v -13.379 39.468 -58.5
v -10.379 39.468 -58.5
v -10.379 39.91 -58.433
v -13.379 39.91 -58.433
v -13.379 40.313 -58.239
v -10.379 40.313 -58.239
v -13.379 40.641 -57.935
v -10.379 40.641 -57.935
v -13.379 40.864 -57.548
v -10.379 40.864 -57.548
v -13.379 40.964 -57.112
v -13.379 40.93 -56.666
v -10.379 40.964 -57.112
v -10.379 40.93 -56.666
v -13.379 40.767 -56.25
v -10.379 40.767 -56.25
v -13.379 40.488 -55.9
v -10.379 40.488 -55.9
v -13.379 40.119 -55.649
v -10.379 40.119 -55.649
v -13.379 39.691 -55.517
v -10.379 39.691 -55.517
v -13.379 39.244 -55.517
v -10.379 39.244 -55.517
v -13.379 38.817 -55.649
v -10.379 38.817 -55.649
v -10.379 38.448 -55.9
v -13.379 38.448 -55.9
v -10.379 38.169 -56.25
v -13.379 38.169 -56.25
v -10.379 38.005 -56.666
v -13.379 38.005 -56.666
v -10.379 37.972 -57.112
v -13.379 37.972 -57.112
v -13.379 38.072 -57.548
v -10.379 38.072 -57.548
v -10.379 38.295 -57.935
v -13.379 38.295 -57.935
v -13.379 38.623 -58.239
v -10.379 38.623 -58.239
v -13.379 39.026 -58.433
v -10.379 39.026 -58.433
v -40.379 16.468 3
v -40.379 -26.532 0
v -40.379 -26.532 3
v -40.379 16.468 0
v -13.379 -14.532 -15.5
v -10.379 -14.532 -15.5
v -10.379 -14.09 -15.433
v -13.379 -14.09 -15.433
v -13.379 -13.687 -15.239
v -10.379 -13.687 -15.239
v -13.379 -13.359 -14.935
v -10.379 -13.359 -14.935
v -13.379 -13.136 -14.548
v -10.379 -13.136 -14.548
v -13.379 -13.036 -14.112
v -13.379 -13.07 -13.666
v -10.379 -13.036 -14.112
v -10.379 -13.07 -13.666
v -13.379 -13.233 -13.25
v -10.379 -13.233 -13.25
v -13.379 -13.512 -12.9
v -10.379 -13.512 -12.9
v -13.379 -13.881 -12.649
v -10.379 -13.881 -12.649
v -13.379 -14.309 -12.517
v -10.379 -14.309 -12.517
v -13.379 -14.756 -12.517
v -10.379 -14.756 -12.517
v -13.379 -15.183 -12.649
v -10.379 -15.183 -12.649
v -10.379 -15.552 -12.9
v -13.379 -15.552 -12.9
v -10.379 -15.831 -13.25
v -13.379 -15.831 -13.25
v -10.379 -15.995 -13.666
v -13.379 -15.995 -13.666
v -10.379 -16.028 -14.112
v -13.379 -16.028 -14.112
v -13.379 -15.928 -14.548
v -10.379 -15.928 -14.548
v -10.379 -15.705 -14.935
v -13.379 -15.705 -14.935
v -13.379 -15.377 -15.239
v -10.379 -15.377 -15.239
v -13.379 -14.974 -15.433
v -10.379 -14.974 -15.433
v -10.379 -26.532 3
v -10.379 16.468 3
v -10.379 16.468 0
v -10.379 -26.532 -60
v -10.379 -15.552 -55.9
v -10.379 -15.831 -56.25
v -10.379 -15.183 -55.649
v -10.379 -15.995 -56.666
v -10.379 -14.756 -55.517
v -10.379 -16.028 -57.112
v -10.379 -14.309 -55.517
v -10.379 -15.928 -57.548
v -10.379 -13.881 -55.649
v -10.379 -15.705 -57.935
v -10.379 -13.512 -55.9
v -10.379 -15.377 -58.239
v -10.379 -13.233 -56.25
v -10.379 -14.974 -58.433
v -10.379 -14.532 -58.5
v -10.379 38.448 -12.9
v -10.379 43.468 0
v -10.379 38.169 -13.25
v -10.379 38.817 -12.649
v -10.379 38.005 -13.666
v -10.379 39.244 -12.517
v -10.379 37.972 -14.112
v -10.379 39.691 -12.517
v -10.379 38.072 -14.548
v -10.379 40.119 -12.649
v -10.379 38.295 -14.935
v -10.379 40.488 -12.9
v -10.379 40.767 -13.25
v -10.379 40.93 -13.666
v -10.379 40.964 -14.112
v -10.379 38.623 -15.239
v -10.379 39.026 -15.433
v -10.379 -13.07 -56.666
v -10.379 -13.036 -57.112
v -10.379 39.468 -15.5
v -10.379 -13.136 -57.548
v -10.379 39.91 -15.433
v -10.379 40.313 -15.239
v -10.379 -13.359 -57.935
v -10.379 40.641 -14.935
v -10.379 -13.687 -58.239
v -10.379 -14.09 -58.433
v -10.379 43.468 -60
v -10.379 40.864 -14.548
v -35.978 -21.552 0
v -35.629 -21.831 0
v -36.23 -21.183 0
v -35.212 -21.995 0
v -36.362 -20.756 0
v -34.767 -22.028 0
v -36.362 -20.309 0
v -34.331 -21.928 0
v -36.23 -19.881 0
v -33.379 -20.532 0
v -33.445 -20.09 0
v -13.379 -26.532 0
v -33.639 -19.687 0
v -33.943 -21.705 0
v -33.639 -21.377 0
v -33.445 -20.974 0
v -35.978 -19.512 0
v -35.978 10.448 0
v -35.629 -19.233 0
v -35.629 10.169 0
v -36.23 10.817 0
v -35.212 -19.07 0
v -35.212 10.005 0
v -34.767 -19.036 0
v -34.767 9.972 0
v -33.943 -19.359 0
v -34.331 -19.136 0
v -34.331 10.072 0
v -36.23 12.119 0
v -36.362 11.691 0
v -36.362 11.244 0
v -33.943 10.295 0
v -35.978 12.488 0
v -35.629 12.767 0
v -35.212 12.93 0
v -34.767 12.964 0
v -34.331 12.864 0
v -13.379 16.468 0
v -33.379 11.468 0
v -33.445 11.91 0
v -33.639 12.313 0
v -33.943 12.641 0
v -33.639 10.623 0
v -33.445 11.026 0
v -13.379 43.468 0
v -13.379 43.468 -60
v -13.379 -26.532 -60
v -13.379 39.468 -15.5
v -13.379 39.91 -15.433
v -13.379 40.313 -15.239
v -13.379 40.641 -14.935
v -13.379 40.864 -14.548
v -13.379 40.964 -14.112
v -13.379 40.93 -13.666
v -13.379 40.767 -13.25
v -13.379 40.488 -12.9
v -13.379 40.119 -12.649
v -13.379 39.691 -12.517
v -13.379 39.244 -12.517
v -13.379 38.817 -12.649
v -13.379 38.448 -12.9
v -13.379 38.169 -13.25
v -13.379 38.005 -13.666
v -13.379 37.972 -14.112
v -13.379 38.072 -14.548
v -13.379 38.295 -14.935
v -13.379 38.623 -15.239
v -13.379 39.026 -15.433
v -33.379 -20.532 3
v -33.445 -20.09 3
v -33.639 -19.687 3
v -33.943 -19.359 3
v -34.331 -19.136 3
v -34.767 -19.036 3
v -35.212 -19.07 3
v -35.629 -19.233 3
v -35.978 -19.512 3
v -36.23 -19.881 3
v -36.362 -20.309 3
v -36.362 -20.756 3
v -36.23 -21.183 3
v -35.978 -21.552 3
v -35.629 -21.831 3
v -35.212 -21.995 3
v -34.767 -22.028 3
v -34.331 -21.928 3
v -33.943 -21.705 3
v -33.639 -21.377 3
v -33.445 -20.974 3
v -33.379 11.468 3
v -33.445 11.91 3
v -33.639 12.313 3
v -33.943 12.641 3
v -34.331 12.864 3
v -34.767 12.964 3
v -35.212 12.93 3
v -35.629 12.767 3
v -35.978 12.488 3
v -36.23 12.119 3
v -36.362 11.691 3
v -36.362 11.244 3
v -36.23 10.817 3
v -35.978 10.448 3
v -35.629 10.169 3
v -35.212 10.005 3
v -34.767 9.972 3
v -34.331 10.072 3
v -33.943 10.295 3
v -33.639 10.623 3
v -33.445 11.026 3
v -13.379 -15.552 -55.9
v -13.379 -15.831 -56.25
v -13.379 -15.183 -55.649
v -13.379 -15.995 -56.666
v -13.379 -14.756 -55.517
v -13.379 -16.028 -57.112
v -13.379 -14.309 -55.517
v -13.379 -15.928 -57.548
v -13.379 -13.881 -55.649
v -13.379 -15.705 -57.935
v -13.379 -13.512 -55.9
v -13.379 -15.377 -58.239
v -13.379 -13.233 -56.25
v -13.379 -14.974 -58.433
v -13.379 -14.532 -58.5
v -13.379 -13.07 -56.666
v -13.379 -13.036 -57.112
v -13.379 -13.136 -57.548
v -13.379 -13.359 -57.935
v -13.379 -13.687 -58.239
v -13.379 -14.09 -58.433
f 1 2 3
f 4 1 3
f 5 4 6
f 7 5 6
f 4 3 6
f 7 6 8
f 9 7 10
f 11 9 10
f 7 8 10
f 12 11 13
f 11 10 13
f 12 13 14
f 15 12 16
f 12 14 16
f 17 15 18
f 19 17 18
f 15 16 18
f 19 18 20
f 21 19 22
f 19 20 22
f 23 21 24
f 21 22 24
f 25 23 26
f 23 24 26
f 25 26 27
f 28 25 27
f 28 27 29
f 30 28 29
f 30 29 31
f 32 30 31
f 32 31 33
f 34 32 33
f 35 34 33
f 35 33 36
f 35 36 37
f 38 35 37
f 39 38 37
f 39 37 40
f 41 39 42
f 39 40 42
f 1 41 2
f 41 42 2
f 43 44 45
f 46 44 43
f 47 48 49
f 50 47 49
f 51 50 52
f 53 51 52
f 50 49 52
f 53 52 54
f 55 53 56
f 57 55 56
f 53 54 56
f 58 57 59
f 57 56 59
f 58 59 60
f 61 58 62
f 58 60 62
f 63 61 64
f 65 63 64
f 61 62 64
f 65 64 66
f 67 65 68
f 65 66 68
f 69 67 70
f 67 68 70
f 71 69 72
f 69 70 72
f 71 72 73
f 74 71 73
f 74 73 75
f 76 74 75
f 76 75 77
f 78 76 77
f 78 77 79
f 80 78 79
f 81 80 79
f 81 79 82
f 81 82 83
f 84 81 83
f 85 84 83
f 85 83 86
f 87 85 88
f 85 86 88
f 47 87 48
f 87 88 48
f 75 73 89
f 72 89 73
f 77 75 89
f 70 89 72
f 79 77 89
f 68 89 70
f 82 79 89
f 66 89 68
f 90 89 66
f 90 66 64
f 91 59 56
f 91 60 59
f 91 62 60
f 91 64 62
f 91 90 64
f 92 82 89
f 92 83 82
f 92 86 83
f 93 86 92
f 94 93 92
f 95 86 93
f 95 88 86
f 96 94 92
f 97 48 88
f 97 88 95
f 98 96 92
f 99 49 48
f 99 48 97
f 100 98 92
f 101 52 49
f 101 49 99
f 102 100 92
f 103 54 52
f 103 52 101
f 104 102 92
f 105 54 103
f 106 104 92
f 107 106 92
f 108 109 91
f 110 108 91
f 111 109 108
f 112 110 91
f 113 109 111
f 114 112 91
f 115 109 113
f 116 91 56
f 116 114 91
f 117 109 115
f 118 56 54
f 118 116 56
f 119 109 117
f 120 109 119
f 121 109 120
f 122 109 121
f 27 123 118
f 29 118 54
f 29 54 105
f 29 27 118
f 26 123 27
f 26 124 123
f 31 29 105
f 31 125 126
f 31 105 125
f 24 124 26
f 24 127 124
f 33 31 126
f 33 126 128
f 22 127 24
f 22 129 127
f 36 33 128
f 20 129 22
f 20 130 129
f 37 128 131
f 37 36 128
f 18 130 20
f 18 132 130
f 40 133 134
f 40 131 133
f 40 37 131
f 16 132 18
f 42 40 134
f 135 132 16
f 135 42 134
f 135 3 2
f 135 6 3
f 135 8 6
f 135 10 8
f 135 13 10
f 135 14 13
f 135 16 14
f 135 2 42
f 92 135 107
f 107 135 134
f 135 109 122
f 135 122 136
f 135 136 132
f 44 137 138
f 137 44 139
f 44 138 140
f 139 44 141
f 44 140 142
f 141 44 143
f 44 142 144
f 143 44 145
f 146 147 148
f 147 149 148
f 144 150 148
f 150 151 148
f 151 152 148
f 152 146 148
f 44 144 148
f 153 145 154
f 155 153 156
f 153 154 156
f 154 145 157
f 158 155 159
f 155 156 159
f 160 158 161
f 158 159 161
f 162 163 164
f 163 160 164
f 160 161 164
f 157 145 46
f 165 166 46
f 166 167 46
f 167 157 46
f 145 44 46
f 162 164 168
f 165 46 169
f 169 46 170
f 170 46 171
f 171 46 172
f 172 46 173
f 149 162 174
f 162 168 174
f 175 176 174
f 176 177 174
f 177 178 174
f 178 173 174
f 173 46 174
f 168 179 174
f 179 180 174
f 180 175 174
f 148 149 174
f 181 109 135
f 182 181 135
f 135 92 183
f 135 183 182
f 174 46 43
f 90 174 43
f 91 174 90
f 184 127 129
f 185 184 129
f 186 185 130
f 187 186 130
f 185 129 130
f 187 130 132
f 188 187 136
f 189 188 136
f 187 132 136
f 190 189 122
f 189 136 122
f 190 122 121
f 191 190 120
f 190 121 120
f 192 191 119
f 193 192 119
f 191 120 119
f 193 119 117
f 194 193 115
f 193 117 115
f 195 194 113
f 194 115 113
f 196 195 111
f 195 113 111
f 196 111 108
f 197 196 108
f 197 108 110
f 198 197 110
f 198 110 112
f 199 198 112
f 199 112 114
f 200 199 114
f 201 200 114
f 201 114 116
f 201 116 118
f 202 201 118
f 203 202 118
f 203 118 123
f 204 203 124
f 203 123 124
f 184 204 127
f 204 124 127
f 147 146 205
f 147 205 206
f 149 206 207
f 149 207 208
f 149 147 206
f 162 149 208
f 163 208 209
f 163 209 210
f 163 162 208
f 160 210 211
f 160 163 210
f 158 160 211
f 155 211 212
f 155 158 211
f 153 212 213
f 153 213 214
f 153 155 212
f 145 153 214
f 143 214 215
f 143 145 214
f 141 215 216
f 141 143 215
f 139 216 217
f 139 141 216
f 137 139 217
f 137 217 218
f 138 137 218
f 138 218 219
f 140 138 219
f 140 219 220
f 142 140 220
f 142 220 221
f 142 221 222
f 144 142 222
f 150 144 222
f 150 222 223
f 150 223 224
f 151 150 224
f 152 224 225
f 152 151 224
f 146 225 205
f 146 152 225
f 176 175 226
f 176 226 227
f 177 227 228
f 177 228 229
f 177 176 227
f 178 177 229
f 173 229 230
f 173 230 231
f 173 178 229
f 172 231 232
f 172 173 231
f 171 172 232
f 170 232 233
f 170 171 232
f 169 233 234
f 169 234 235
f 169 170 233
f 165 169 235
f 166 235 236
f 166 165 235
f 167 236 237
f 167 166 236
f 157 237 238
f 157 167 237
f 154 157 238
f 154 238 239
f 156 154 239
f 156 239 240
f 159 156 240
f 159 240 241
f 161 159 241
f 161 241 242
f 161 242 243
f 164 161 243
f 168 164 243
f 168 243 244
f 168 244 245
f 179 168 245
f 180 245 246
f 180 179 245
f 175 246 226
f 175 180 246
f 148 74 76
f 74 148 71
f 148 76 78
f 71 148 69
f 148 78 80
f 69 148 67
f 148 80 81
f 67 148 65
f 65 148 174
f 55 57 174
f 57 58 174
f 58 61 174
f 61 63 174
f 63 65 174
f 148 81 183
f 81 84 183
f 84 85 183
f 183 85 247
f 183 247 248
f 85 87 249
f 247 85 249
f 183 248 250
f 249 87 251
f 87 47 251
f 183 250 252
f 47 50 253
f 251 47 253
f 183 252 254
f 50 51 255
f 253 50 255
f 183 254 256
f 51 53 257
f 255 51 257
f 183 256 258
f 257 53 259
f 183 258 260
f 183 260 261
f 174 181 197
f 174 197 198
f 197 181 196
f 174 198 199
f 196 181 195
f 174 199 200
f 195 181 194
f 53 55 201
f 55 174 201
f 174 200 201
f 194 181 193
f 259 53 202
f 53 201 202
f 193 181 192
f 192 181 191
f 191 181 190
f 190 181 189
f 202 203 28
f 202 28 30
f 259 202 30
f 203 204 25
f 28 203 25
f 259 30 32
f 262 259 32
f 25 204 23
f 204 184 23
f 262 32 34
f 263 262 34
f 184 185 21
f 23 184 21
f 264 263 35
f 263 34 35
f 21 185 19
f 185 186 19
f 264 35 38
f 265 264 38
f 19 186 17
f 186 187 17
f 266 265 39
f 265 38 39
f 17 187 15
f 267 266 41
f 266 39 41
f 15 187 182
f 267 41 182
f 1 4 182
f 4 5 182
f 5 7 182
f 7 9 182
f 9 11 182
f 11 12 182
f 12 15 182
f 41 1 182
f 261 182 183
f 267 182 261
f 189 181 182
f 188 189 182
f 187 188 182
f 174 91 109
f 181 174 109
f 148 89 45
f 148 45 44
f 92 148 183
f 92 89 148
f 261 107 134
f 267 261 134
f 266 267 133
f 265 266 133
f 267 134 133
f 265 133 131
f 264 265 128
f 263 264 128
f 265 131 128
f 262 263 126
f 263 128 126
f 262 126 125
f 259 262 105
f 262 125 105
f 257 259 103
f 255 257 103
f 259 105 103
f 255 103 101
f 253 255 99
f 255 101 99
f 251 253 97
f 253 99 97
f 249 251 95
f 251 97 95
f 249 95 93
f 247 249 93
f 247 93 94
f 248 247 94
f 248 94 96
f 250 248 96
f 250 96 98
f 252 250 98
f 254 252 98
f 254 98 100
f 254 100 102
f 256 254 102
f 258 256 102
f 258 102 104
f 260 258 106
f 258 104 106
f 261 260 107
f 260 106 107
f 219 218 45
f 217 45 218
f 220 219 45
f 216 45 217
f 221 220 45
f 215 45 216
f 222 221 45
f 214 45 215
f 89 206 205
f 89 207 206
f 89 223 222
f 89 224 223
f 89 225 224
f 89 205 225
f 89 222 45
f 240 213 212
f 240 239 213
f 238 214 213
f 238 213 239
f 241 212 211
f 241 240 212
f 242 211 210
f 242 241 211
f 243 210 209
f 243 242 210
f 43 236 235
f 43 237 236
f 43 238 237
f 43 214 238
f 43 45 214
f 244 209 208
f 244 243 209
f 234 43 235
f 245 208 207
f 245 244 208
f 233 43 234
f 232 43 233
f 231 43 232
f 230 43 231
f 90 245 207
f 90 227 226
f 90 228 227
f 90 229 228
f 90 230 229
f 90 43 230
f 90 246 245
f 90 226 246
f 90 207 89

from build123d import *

# Parameters (mm, degrees)
CROQUIS1_W              = 30
CROQUIS1_H              = 43
CROQUIS1_R              = 1.5
SALIENTE_EXTRUIR1_DEPTH = 3
CROQUIS2_W              = 60
CROQUIS2_H              = 70
CROQUIS2_R              = 1.5
SALIENTE_EXTRUIR2_DEPTH = 3


with BuildPart() as part:
    # Croquis1 → Saliente-Extruir1 (new body)
    with BuildSketch(Plane.XY):
        with Locations((-25.378630764, -5.032160817)):
            Rectangle(CROQUIS1_W, CROQUIS1_H)
        with Locations((-34.878630764, 11.467839183)):
            Circle(CROQUIS1_R, mode=Mode.SUBTRACT)
        with Locations((-34.878630764, -20.532160817)):
            Circle(CROQUIS1_R, mode=Mode.SUBTRACT)
    extrude(amount=SALIENTE_EXTRUIR1_DEPTH)

    # Croquis2 → Saliente-Extruir2 (add)
    with BuildSketch(Plane(origin=(-10.378630764, 0, 0), x_dir=(0, 0, -1), z_dir=(1, 0, 0))):
        with Locations((30, 8.467839183)):
            Rectangle(CROQUIS2_W, CROQUIS2_H)
        with Locations((57, 39.467839183)):
            Circle(CROQUIS2_R, mode=Mode.SUBTRACT)
        with Locations((14, 39.467839183)):
            Circle(CROQUIS2_R, mode=Mode.SUBTRACT)
        with Locations((14, -14.532160817)):
            Circle(CROQUIS2_R, mode=Mode.SUBTRACT)
        with Locations((57, -14.532160817)):
            Circle(CROQUIS2_R, mode=Mode.SUBTRACT)
    extrude(amount=-SALIENTE_EXTRUIR2_DEPTH)


solid = part.part
